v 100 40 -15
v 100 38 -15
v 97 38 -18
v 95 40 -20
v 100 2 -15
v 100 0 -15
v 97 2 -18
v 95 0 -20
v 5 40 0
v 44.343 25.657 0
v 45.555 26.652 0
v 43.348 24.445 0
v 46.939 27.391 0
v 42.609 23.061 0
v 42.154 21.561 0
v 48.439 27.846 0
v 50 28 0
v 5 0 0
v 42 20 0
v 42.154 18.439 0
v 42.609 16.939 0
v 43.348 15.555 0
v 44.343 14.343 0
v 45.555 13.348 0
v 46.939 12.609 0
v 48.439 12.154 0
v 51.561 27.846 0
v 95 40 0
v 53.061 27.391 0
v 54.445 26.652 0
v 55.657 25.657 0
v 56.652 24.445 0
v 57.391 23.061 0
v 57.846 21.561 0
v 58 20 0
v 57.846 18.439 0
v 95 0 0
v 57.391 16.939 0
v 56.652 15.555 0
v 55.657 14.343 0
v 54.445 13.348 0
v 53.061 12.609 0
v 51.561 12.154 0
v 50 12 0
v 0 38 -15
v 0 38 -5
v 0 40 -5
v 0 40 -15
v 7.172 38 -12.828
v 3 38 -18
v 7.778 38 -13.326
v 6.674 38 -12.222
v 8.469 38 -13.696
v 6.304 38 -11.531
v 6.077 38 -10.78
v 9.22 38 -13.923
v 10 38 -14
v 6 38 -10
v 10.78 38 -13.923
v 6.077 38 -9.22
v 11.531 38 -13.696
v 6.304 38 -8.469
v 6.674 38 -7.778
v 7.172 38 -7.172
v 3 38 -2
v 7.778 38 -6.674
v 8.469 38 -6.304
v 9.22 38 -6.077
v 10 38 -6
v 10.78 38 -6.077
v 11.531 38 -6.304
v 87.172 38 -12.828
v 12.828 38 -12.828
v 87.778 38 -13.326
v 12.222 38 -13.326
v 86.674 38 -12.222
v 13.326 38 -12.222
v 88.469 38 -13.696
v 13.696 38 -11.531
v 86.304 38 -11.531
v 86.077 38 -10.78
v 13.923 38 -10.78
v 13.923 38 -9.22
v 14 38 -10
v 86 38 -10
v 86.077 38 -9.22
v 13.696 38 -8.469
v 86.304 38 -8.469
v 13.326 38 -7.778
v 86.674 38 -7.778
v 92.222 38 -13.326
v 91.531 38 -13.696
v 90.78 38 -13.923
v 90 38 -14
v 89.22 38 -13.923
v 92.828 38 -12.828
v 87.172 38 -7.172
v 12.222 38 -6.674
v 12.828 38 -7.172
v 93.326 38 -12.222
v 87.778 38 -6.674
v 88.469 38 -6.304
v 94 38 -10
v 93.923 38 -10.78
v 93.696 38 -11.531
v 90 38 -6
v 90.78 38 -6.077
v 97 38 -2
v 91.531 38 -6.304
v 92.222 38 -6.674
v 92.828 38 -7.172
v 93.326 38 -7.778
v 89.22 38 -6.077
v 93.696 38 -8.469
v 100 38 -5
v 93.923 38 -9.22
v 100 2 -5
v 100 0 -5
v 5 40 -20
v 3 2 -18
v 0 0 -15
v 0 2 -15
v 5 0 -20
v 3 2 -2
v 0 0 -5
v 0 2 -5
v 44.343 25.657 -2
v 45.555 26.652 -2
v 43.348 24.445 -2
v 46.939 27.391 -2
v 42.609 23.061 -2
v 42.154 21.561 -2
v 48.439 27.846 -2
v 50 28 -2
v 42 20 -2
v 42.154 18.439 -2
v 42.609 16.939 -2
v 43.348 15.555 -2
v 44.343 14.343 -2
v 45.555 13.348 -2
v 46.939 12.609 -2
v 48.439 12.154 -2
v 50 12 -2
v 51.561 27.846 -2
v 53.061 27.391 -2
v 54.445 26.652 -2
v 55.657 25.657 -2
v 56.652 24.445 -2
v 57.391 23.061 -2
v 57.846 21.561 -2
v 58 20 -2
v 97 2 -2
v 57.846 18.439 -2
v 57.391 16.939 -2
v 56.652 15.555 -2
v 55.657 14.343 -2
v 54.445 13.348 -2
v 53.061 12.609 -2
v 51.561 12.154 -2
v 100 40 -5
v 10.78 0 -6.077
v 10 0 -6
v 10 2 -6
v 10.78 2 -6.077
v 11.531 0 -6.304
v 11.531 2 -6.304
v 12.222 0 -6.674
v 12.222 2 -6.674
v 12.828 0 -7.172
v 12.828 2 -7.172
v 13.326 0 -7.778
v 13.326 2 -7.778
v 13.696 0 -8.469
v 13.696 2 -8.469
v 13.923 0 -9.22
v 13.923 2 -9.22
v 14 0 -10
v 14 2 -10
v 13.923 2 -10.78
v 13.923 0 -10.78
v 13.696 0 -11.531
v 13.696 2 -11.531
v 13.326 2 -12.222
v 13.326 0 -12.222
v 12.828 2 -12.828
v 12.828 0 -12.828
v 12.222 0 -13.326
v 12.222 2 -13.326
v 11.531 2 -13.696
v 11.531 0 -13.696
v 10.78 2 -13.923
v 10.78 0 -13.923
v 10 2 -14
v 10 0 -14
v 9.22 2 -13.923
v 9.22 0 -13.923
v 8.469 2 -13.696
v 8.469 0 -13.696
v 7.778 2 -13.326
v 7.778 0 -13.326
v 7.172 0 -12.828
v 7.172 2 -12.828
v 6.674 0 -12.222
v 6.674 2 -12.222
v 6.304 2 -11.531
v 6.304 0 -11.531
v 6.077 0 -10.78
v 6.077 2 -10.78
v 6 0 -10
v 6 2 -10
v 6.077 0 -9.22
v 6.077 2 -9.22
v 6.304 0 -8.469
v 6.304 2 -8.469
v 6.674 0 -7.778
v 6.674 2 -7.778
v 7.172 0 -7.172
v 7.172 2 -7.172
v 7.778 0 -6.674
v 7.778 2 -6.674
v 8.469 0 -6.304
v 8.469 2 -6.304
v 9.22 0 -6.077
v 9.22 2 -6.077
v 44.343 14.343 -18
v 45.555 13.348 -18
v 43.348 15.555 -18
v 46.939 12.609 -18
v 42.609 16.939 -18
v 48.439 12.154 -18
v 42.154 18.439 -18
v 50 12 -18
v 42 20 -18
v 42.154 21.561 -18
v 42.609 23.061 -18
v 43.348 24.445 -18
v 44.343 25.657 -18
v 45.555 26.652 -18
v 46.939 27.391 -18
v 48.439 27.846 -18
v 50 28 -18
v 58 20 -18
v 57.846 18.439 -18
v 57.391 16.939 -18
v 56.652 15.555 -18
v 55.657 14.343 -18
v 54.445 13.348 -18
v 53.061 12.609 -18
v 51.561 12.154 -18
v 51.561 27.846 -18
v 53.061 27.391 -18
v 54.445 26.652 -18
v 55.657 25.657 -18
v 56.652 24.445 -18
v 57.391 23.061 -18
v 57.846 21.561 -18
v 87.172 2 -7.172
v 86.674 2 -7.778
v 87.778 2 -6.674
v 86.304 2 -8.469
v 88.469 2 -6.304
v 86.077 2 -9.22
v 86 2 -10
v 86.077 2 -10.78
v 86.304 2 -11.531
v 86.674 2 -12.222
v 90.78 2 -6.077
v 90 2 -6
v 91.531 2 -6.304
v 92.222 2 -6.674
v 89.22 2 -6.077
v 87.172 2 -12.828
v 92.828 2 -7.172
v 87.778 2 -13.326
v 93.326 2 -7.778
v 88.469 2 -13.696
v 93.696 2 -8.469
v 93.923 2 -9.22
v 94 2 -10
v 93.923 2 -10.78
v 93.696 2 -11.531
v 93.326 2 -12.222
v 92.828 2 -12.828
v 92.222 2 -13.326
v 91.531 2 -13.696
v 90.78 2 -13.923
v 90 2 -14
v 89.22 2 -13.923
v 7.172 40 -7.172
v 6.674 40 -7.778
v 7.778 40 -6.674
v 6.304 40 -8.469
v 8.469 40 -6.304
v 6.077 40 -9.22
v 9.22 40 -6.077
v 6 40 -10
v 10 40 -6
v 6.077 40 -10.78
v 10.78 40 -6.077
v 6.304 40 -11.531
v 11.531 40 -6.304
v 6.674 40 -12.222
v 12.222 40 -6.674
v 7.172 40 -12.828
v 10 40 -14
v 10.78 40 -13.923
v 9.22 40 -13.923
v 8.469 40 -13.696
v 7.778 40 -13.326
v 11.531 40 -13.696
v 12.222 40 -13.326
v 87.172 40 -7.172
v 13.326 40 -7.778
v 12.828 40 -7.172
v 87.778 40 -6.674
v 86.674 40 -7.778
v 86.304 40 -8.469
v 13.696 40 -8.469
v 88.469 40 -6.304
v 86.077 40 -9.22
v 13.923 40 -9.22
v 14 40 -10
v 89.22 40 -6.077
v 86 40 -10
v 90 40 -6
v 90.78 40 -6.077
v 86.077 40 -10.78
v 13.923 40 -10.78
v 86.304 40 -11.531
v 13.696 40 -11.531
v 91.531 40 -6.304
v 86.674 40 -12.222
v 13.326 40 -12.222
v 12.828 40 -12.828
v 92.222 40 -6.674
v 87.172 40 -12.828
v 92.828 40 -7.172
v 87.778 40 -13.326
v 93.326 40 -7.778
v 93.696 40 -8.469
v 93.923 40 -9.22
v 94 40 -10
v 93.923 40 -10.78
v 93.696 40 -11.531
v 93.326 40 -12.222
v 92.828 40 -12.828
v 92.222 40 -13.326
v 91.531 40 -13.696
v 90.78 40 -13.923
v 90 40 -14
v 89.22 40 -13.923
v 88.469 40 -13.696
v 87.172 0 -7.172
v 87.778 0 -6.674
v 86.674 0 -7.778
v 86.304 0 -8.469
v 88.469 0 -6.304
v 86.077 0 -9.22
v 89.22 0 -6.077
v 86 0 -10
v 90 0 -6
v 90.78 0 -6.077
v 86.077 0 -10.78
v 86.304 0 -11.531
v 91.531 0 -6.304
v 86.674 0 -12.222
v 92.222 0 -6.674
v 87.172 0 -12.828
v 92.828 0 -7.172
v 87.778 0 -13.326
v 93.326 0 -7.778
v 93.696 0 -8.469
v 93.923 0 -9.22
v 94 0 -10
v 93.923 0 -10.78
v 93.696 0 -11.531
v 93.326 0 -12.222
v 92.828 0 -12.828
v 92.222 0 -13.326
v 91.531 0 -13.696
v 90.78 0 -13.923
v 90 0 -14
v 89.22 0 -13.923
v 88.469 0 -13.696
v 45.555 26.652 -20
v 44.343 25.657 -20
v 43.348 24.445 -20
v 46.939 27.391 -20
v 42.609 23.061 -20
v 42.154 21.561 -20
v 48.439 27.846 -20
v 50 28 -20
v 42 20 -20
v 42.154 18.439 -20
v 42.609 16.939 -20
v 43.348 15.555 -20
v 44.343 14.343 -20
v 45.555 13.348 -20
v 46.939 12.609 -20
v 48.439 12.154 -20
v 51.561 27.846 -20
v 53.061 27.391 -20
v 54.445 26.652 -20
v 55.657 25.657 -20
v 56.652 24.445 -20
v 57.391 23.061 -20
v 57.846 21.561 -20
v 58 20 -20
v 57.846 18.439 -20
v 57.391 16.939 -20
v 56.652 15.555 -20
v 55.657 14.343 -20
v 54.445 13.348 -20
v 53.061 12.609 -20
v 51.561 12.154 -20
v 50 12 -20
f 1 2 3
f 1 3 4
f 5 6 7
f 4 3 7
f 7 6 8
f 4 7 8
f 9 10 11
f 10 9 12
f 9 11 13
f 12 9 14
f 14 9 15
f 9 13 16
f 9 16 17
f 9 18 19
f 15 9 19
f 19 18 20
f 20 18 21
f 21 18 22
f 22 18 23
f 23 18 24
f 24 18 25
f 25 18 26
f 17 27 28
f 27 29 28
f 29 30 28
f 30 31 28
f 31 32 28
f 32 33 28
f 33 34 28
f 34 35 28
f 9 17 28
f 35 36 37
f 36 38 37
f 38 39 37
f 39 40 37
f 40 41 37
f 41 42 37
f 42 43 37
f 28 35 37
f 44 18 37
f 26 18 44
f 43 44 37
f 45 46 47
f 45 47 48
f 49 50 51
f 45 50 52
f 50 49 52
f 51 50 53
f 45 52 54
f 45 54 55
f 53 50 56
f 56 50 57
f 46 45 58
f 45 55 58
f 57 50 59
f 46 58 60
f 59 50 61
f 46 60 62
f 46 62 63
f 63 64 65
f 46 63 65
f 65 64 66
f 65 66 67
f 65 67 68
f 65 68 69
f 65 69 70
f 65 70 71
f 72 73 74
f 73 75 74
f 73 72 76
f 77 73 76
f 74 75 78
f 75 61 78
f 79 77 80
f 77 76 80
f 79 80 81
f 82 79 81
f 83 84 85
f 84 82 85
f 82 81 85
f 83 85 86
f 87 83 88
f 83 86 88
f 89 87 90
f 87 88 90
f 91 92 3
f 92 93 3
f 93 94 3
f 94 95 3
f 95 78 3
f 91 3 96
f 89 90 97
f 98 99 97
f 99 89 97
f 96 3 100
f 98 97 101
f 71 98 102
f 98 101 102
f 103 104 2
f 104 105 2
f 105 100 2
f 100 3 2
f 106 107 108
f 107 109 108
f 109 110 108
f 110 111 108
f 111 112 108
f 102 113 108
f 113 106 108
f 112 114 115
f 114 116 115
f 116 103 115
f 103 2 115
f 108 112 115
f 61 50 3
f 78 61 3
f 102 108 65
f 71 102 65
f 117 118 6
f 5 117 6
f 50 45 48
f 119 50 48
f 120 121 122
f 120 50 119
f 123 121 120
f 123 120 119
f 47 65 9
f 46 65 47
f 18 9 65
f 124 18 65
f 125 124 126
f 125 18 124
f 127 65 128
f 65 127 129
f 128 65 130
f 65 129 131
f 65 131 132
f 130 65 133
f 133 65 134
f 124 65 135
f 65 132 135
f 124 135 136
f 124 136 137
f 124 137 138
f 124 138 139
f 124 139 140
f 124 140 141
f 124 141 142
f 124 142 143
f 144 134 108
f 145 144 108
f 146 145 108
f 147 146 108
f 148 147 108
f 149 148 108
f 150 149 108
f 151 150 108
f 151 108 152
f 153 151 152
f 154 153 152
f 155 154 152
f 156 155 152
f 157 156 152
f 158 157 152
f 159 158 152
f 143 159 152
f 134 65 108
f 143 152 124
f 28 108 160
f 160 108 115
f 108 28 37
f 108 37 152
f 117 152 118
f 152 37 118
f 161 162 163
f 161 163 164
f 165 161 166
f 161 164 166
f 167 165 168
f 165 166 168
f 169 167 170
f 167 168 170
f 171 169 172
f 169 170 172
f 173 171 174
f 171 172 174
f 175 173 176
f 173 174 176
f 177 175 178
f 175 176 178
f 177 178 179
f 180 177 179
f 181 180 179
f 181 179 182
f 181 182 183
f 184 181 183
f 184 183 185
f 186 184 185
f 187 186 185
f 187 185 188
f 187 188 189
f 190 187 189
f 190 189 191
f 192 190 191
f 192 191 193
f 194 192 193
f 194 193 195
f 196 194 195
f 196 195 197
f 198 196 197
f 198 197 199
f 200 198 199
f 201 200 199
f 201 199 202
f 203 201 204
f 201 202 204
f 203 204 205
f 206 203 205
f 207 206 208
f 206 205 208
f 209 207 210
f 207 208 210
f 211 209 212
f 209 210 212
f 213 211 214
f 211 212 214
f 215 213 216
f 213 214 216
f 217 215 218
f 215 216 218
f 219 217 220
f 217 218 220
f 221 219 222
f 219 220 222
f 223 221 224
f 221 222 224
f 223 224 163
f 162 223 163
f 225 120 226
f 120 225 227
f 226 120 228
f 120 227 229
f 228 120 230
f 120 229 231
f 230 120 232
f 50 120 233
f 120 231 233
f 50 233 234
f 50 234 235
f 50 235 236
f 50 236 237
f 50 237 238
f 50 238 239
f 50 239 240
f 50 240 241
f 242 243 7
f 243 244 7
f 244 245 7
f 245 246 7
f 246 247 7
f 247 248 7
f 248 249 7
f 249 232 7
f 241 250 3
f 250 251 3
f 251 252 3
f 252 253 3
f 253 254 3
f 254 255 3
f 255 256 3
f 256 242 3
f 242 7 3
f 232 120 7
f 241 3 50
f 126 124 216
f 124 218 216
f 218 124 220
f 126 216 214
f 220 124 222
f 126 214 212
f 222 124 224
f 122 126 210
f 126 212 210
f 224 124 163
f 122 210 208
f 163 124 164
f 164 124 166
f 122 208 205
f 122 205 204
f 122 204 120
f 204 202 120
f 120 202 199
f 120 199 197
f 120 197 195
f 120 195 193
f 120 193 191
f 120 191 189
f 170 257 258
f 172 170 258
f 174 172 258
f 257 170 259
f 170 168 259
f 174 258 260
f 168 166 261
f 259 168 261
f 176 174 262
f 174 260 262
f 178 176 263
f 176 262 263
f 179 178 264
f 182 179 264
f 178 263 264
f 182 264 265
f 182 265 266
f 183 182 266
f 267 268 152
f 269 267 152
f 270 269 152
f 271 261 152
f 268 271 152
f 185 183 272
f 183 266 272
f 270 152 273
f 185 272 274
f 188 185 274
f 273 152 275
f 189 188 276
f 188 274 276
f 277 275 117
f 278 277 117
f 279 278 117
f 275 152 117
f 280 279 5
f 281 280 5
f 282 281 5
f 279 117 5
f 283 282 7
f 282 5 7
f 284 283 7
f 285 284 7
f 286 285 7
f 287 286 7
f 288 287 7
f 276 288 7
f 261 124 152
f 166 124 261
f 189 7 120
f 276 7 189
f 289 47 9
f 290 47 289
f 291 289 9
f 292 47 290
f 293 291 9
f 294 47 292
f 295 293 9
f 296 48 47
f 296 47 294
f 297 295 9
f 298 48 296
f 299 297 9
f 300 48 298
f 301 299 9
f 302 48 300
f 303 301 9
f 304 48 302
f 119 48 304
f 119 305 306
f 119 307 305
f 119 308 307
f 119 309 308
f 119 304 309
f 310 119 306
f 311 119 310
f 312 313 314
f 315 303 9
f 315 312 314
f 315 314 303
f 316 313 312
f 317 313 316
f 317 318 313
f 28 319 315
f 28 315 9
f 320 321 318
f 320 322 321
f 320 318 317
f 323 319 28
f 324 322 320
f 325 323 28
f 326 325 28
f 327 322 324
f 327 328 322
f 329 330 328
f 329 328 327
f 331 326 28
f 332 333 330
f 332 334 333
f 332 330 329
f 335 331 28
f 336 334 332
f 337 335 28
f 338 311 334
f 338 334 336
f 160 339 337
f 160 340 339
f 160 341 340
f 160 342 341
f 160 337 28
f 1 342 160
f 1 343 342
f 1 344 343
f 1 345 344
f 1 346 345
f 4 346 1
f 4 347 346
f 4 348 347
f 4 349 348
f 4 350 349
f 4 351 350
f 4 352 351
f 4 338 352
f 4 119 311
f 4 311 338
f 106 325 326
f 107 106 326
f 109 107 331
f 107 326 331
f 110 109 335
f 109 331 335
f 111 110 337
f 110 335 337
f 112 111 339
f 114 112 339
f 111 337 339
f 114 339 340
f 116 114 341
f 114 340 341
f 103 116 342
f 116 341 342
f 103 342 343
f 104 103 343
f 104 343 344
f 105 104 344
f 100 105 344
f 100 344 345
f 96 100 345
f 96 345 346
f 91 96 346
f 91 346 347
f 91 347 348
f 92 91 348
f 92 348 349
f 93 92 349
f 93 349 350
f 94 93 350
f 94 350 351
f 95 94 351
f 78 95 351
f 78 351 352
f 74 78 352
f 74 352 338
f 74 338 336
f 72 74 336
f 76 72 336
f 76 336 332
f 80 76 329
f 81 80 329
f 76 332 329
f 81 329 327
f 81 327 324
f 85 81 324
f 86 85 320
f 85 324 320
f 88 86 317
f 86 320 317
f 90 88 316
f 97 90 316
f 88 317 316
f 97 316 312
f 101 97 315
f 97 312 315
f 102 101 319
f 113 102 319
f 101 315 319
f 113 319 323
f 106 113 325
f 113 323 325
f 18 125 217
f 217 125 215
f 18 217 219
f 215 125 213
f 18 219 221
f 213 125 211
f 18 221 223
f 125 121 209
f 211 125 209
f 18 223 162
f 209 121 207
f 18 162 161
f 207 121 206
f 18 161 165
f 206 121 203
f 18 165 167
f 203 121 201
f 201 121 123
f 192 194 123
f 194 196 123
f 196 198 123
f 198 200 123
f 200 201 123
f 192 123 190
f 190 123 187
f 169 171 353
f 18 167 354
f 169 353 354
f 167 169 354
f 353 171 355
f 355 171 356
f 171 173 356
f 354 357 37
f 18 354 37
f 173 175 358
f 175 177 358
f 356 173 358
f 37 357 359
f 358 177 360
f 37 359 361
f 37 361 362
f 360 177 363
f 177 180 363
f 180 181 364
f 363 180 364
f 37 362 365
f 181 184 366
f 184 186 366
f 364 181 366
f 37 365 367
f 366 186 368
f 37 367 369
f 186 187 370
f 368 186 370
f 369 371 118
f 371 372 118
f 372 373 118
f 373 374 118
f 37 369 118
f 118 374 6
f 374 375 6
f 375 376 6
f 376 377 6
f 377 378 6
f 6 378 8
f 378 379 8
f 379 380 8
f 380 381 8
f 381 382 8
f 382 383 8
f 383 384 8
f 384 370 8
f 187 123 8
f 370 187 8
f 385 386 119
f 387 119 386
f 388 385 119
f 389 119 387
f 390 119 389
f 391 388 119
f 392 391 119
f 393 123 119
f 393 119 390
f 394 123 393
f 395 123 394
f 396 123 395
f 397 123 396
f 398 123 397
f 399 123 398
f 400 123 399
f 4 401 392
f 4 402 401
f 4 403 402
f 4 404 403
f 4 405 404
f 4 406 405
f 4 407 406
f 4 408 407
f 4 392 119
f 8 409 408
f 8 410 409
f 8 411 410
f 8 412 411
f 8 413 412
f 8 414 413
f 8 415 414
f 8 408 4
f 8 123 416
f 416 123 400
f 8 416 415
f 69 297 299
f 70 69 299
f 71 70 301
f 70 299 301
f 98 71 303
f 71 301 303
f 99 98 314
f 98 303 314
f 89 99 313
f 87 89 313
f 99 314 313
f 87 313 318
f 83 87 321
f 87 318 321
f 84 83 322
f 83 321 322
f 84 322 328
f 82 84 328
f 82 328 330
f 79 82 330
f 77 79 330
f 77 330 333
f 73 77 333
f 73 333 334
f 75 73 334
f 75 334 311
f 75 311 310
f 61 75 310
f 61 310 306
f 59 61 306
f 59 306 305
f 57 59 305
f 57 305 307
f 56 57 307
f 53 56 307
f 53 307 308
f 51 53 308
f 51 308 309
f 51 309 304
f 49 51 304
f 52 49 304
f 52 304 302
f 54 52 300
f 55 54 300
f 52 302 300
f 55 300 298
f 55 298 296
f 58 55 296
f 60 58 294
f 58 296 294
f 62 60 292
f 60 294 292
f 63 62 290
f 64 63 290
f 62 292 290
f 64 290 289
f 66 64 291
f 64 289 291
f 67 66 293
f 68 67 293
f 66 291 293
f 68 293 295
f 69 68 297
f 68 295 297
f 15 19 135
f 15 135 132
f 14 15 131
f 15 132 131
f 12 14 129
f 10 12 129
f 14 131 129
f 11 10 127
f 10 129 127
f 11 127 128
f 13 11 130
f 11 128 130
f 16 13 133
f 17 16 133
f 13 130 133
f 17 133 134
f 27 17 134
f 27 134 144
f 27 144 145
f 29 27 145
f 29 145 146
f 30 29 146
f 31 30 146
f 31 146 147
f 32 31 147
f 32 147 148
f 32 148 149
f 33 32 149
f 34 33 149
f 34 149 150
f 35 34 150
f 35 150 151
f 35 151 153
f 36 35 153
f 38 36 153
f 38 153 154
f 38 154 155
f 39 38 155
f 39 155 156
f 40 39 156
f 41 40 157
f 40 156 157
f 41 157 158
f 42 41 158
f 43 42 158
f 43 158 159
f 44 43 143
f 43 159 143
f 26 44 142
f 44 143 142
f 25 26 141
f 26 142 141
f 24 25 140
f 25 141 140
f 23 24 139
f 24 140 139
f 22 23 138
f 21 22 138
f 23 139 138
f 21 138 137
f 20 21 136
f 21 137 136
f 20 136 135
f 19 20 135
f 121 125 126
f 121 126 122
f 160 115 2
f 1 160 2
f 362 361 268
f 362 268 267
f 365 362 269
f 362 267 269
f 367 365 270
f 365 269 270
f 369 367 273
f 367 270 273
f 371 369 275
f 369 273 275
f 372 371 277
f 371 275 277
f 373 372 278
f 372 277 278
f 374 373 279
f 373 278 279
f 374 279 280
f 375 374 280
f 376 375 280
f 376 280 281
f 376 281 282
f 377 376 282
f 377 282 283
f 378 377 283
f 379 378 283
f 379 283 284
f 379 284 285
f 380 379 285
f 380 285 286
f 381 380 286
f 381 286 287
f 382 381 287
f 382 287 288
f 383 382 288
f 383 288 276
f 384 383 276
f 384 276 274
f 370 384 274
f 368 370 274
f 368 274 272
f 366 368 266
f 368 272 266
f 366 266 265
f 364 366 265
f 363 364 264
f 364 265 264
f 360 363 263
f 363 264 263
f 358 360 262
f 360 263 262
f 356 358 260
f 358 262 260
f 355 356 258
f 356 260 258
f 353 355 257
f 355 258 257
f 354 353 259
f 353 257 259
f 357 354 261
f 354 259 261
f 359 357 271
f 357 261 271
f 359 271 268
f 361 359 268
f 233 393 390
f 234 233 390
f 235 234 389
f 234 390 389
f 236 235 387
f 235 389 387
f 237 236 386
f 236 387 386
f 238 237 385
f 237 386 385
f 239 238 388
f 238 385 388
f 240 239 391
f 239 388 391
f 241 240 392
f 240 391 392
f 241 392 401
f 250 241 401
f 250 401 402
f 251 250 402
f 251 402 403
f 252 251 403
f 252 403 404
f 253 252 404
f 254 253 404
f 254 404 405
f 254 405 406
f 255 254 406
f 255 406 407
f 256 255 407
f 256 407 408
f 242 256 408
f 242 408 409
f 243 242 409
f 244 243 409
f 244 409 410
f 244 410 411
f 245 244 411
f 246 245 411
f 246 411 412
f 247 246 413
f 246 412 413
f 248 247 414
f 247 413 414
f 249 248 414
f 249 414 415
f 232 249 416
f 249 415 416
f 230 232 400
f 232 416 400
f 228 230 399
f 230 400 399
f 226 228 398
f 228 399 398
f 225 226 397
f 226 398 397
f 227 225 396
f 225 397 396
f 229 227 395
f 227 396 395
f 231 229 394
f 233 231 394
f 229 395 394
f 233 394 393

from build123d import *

# Parameters (mm, degrees)
SKETCH1_W           = 100
SKETCH1_H           = 20
BOSS_EXTRUDE1_DEPTH = 40
SKETCH2_R           = 4
CUT_EXTRUDE1_DEPTH  = 110.544511501
SKETCH3_R           = 8
CUT_EXTRUDE2_DEPTH  = 110.544511501
CUT_EXTRUDE3_DEPTH  = 109.480412979
CHAMFER1_SIZE       = 5


with BuildPart() as part:
    # Sketch1 → Boss-Extrude1 (new body)
    with BuildSketch(Plane(origin=(0, 0, 0), x_dir=(1, 0, 0), z_dir=(0, 1, 0))):
        with Locations((50, 10)):
            Rectangle(SKETCH1_W, SKETCH1_H)
    extrude(amount=BOSS_EXTRUDE1_DEPTH)

    # Sketch2 → Cut-Extrude1 (cut, through all)
    with BuildSketch(Plane(origin=(0, 40, 0), x_dir=(1, 0, 0), z_dir=(0, 1, 0))):
        with Locations(Location((10, 10, 0), (0, 0, 270))):
            Circle(SKETCH2_R)
        with Locations(Location((90, 10, 0), (0, 0, 270))):
            Circle(SKETCH2_R)
    extrude(amount=-CUT_EXTRUDE1_DEPTH, mode=Mode.SUBTRACT)

    # Sketch3 → Cut-Extrude2 (cut, through all)
    with BuildSketch(Plane(origin=(0, 0, -20), x_dir=(-1, 0, 0), z_dir=(0, 0, -1))):
        with Locations((-50, 20)):
            Circle(SKETCH3_R)
    extrude(amount=-CUT_EXTRUDE2_DEPTH, mode=Mode.SUBTRACT)

    # 3DSketch1 → Cut-Extrude3 (cut, through all)
    with BuildSketch(Plane(origin=(100, 38, -18), x_dir=(0, -0.913811548620257, 0.4061384660534479), z_dir=(-1, 0, 0))):
        Polygon((0, 0), (6.498215457, 14.620984778), (39.395431207, 0), (32.89721575, -14.620984778), align=None)
    extrude(amount=CUT_EXTRUDE3_DEPTH, mode=Mode.SUBTRACT)

    # Chamfer1
    # the kernel refuses this chamfer: 5 mm, written as the material it takes off along each edge
    with BuildSketch(Plane(origin=(100, -12.85841494, -20), x_dir=(0.0274958766105877, 0, 0.9996219169112968), z_dir=(0, 1, 0)), Plane(origin=(100, -12.85841494, 0), x_dir=(-0.9996219169112968, 0, 0.027495876610586334), z_dir=(0, 1, 0))) as chamfer1_piece_1:
        Polygon((CHAMFER1_SIZE * 0.999621916911, -CHAMFER1_SIZE * 0.0274958766106), (-CHAMFER1_SIZE * 0.0274958766106, -CHAMFER1_SIZE * 0.999621916911), (0, 0), align=None)
    extrude(amount=65.71682988, mode=Mode.SUBTRACT)
    with BuildSketch(Plane(origin=(0, -12.85841494, -20), x_dir=(-0.027495876610586372, 0, 0.9996219169112968), z_dir=(0, 1, 0)), Plane(origin=(0, -12.85841494, 0), x_dir=(0.9996219169112968, 0, 0.027495876610586372), z_dir=(0, 1, 0))) as chamfer1_piece_2:
        Polygon((CHAMFER1_SIZE * 0.999621916911, CHAMFER1_SIZE * 0.0274958766106), (-CHAMFER1_SIZE * 0.0274958766106, CHAMFER1_SIZE * 0.999621916911), (0, 0), align=None)
    extrude(amount=65.71682988, mode=Mode.SUBTRACT)


solid = part.part
